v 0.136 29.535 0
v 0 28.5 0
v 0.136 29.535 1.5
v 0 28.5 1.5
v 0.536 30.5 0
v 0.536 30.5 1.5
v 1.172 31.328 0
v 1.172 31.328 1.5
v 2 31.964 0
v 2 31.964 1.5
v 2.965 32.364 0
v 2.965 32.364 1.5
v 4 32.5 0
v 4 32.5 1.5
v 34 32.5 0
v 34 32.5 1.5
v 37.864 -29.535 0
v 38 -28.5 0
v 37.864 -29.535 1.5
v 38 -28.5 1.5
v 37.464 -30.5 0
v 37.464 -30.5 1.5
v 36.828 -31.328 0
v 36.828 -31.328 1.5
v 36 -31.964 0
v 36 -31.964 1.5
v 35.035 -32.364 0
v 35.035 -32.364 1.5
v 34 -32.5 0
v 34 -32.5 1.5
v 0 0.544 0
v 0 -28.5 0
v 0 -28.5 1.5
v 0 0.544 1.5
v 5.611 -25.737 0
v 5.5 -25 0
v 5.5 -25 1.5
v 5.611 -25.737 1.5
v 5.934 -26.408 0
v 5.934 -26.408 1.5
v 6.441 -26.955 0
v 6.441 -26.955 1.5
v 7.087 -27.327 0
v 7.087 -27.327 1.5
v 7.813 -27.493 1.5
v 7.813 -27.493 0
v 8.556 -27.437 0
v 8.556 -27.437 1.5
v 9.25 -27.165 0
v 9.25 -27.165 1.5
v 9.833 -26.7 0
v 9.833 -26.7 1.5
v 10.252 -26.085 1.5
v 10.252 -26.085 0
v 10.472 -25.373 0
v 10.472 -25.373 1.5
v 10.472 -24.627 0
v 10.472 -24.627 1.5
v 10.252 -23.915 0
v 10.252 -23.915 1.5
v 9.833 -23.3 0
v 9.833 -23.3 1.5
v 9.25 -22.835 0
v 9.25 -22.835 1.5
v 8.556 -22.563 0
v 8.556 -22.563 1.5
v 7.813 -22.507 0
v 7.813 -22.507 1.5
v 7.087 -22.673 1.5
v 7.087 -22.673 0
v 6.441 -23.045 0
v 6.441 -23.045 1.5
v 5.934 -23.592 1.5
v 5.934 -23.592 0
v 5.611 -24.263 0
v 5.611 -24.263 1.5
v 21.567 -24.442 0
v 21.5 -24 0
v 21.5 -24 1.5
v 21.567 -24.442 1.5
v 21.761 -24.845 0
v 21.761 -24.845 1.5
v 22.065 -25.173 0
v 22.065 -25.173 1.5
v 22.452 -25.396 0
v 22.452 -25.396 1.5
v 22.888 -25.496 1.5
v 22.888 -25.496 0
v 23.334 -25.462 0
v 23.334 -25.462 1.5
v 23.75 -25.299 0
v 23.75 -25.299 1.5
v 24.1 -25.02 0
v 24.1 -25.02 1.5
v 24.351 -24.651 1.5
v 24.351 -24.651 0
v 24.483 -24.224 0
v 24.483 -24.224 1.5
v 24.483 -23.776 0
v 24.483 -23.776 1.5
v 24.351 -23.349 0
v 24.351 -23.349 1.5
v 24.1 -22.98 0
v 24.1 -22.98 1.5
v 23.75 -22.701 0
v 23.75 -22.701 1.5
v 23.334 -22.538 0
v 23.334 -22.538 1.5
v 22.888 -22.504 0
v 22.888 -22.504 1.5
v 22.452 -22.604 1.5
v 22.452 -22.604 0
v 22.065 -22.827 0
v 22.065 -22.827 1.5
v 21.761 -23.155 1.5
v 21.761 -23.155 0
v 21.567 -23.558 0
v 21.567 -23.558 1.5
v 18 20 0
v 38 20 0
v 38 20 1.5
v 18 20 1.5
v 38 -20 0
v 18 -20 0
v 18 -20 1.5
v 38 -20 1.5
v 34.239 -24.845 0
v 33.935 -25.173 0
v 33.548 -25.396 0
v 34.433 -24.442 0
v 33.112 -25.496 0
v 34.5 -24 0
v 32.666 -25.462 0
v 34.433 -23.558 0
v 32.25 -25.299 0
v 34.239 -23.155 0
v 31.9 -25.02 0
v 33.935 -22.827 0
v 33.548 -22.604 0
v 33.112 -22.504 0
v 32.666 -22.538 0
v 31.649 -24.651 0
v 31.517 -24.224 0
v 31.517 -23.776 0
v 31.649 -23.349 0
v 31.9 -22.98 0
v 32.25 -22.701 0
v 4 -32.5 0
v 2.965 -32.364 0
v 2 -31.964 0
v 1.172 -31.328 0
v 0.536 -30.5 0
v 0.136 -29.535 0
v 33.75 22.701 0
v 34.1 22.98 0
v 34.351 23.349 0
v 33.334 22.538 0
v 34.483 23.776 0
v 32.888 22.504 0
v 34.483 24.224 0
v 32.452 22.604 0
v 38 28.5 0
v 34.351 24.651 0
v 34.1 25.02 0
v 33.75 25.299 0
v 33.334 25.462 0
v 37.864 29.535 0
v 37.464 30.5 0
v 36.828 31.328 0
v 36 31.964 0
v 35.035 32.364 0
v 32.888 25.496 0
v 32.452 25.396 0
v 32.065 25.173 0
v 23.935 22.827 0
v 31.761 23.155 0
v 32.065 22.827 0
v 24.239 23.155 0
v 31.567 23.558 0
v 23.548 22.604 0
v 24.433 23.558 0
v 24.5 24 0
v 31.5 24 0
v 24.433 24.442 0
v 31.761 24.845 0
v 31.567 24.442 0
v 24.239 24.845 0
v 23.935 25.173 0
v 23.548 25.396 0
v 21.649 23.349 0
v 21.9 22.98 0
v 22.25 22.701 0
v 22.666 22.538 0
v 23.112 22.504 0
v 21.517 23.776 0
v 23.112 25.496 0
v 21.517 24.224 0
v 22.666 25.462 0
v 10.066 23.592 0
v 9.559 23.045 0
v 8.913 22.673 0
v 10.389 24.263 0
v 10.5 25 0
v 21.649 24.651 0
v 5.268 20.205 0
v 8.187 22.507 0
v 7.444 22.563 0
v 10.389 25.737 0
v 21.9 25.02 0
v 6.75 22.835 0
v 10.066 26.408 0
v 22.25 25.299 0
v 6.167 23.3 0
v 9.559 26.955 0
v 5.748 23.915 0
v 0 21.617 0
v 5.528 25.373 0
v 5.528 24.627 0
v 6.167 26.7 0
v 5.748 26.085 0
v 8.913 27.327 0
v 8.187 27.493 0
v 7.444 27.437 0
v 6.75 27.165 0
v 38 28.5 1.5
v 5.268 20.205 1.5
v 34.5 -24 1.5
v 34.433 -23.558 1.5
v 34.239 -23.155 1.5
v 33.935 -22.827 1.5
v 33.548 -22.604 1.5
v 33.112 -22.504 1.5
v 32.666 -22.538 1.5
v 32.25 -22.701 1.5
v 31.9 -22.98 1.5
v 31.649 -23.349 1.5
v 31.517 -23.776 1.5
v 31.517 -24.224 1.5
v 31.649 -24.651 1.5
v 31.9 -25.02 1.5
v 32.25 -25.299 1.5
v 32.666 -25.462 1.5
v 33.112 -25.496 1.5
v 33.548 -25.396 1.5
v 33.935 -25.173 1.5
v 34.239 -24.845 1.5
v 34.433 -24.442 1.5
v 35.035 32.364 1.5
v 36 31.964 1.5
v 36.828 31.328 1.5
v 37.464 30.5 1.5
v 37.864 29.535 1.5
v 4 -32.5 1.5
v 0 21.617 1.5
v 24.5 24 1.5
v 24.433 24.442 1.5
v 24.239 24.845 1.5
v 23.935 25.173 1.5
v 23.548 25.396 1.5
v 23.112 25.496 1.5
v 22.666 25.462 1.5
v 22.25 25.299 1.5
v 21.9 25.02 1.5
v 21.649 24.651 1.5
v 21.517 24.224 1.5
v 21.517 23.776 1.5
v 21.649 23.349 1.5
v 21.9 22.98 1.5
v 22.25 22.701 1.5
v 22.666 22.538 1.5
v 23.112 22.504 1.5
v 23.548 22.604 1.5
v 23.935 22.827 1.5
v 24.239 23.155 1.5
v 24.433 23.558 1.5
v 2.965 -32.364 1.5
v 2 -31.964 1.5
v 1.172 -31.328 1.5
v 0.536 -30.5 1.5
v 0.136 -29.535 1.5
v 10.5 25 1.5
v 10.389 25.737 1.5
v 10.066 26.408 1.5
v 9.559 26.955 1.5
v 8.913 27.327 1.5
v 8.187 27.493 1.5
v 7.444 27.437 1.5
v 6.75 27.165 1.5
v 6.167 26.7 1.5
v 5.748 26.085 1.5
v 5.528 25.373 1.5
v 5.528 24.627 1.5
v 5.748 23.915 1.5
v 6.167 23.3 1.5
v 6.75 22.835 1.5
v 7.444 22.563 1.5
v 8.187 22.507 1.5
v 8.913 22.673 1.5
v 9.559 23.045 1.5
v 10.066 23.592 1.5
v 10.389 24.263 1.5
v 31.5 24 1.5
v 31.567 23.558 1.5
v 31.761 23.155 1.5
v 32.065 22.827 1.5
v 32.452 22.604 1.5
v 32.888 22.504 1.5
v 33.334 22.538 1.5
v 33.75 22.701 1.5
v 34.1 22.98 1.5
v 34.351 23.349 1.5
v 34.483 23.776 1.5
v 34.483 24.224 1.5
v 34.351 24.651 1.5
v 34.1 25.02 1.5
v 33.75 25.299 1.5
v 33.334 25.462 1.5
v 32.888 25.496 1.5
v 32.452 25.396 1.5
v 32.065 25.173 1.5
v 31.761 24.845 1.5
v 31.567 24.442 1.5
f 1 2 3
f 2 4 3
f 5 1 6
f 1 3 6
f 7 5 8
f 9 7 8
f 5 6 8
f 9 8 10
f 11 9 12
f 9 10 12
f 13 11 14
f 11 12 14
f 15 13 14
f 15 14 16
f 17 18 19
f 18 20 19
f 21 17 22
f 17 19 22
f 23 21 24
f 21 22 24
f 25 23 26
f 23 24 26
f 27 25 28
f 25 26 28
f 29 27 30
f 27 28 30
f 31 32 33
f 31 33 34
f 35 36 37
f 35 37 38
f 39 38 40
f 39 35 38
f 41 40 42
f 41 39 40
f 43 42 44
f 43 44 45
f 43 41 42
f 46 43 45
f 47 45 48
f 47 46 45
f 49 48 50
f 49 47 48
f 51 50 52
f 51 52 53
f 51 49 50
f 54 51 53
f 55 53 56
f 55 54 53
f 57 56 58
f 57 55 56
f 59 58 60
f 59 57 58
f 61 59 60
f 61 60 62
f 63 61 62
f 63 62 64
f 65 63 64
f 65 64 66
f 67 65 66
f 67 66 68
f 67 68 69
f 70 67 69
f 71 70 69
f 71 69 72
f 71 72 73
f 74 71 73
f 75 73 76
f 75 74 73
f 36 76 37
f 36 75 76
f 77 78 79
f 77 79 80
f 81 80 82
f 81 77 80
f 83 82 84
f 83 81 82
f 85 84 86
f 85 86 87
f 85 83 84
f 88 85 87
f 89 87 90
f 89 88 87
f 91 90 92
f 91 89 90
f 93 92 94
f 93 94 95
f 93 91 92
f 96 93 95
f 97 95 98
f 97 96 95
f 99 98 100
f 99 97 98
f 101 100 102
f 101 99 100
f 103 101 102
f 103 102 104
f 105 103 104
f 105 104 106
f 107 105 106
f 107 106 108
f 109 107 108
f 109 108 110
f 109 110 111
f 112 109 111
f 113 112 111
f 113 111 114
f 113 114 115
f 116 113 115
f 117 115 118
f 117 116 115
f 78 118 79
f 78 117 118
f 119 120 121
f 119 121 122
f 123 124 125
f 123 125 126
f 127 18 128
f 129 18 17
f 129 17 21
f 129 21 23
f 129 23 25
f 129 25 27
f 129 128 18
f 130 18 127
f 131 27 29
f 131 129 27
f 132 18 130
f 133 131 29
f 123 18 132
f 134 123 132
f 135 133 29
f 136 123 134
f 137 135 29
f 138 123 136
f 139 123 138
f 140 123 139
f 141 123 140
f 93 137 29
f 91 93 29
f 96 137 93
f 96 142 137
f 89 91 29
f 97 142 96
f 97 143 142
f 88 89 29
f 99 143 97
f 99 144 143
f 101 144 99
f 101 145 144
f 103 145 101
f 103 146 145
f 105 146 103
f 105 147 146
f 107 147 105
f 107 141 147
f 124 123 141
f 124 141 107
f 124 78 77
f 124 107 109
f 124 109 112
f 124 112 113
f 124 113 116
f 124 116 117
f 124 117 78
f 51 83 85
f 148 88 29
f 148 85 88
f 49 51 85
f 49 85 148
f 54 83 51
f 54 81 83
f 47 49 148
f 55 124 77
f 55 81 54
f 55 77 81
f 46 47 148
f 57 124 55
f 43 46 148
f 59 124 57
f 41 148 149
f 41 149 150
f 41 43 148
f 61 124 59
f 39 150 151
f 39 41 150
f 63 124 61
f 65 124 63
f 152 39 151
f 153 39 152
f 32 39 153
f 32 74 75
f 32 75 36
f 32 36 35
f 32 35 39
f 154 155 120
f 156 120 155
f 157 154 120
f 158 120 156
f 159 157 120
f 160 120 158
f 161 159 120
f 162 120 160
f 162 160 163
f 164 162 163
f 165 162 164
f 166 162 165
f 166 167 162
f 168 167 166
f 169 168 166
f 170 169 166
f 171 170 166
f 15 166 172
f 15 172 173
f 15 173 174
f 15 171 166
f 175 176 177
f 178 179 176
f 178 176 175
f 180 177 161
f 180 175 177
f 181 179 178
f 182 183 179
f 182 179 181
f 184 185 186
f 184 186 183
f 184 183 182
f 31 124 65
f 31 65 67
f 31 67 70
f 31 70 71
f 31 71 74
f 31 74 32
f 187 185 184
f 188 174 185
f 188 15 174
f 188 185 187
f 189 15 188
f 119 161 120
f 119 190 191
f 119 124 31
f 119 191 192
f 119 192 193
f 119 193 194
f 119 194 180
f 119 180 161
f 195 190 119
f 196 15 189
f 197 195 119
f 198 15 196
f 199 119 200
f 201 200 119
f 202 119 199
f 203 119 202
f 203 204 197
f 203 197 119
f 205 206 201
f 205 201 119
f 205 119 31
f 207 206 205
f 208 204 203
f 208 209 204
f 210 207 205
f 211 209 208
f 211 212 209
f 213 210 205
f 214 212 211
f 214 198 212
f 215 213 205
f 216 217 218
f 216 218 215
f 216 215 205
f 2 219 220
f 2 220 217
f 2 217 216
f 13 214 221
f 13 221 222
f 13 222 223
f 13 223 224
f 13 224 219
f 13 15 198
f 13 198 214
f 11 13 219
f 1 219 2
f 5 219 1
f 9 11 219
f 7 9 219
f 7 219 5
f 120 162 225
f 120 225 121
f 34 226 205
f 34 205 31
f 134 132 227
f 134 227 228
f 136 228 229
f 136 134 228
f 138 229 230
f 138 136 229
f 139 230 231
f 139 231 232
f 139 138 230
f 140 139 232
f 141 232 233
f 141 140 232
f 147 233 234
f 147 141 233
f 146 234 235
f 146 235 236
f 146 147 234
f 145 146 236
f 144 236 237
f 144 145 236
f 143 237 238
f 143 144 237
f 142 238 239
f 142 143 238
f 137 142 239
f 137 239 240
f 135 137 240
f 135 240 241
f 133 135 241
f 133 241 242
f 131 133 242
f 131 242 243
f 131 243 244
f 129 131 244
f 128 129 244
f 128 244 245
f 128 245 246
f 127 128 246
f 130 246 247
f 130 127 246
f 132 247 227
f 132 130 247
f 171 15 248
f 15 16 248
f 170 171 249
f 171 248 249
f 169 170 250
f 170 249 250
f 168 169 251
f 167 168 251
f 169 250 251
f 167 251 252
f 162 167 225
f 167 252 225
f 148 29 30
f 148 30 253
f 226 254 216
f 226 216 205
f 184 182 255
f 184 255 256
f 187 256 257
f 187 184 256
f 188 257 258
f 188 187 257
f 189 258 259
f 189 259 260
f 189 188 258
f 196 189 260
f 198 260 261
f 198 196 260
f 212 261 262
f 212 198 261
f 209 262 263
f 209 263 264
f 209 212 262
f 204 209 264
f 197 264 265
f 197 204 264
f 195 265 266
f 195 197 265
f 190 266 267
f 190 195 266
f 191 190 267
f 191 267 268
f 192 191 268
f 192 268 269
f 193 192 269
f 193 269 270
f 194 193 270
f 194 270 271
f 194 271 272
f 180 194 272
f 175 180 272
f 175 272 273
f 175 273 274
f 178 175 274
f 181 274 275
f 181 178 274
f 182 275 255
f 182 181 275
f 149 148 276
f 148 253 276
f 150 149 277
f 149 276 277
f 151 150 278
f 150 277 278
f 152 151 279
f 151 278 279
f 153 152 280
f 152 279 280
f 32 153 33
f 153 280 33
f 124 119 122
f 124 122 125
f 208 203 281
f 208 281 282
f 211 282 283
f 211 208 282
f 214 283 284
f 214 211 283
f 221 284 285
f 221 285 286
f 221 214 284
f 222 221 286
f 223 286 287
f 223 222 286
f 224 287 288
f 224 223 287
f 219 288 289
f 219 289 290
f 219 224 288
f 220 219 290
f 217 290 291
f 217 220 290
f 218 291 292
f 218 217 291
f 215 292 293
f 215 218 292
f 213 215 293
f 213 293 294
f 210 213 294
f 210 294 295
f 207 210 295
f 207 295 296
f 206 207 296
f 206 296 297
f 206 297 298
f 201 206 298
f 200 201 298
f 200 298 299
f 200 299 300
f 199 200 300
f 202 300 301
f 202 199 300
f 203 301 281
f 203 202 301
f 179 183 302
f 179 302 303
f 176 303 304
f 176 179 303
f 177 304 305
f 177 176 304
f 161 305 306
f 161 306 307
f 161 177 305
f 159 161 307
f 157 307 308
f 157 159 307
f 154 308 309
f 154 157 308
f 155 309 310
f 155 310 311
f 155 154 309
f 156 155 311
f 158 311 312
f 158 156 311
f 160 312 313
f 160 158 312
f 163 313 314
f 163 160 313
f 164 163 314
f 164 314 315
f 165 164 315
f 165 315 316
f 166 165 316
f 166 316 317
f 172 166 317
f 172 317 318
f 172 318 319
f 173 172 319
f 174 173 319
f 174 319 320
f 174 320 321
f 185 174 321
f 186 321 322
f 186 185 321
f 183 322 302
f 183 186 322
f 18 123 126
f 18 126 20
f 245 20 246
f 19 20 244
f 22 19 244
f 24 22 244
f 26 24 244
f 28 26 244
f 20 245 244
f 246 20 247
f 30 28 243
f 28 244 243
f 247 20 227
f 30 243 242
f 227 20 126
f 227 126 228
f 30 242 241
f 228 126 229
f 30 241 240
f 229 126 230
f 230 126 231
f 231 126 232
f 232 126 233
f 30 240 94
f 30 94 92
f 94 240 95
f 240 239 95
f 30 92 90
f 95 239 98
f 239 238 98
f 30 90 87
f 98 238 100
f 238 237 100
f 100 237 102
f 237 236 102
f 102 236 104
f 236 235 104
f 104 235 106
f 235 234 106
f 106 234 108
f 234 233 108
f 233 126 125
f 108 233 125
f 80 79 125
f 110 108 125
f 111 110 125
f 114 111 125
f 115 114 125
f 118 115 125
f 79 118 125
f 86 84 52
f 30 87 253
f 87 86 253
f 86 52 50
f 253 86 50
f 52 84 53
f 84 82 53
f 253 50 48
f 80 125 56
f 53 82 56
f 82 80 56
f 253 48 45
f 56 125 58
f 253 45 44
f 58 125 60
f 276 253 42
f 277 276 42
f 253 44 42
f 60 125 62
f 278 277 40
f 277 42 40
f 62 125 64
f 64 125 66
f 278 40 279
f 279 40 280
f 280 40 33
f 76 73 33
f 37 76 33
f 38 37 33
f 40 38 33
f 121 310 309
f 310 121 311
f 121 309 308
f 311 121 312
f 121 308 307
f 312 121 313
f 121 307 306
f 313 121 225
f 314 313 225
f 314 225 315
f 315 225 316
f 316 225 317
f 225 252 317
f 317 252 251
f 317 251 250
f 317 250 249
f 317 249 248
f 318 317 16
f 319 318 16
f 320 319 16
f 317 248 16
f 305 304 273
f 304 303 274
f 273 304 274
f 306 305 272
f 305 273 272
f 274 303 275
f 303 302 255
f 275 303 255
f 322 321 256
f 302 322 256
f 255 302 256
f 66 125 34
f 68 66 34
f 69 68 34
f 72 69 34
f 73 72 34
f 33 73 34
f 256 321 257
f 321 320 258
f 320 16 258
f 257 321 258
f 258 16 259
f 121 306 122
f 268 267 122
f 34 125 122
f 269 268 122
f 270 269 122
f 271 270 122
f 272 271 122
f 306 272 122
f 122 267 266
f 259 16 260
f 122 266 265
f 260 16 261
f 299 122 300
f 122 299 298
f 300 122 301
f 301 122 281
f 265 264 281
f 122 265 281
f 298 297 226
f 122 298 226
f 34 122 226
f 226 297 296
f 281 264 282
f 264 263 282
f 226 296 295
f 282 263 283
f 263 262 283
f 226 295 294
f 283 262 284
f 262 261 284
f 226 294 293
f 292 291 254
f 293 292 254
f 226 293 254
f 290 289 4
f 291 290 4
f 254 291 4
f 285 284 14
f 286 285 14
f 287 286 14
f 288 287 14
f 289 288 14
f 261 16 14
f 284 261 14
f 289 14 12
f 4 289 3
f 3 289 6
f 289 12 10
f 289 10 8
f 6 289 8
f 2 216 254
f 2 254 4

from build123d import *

# Parameters (mm, degrees)
ESQUISSE1_R             = 2.5
ESQUISSE1_R_2           = 1.5
BOSS_EXTRU_1_DEPTH      = 1.5
CONG_1_R                = 4
ENL_V_MAT_EXTRU_1_DEPTH = 51.024993753


with BuildPart() as part:
    # Esquisse1 → Boss.-Extru.1 (new body)
    with BuildSketch(Plane.XY):
        Polygon((38, -20), (38, -32.5), (0, -32.5), (0, 32.5), (38, 32.5), (38, 20), (18, 20), (18, -20), align=None)
        with Locations((8, 25)):
            Circle(ESQUISSE1_R, mode=Mode.SUBTRACT)
        with Locations((23, 24)):
            Circle(ESQUISSE1_R_2, mode=Mode.SUBTRACT)
        with Locations(Location((33, 24, 0), (0, 0, 180))):
            Circle(ESQUISSE1_R_2, mode=Mode.SUBTRACT)
        with Locations((33, -24)):
            Circle(ESQUISSE1_R_2, mode=Mode.SUBTRACT)
        with Locations(Location((23, -24, 0), (0, 0, 180))):
            Circle(ESQUISSE1_R_2, mode=Mode.SUBTRACT)
        with Locations(Location((8, -25, 0), (0, 0, 180))):
            Circle(ESQUISSE1_R, mode=Mode.SUBTRACT)
    extrude(amount=BOSS_EXTRU_1_DEPTH)

    # Congé1
    cong_1_edges = [part.edges().sort_by_distance(p)[0] for p in [
        (38, -32.5, 0.75),
        (0, -32.5, 0.75),
        (0, 32.5, 0.75),
        (38, 32.5, 0.75),
    ]]
    fillet(cong_1_edges, radius=CONG_1_R)

    # Esquisse2 → Enlèv. mat.-Extru.1 (cut, through all)
    with BuildSketch(Plane.XY.offset(1.5)):
        Polygon((0, 21.617026009), (5.268332191, 20.205380653), (0, 0.543697246), align=None)
    extrude(amount=-ENL_V_MAT_EXTRU_1_DEPTH, mode=Mode.SUBTRACT)


solid = part.part
